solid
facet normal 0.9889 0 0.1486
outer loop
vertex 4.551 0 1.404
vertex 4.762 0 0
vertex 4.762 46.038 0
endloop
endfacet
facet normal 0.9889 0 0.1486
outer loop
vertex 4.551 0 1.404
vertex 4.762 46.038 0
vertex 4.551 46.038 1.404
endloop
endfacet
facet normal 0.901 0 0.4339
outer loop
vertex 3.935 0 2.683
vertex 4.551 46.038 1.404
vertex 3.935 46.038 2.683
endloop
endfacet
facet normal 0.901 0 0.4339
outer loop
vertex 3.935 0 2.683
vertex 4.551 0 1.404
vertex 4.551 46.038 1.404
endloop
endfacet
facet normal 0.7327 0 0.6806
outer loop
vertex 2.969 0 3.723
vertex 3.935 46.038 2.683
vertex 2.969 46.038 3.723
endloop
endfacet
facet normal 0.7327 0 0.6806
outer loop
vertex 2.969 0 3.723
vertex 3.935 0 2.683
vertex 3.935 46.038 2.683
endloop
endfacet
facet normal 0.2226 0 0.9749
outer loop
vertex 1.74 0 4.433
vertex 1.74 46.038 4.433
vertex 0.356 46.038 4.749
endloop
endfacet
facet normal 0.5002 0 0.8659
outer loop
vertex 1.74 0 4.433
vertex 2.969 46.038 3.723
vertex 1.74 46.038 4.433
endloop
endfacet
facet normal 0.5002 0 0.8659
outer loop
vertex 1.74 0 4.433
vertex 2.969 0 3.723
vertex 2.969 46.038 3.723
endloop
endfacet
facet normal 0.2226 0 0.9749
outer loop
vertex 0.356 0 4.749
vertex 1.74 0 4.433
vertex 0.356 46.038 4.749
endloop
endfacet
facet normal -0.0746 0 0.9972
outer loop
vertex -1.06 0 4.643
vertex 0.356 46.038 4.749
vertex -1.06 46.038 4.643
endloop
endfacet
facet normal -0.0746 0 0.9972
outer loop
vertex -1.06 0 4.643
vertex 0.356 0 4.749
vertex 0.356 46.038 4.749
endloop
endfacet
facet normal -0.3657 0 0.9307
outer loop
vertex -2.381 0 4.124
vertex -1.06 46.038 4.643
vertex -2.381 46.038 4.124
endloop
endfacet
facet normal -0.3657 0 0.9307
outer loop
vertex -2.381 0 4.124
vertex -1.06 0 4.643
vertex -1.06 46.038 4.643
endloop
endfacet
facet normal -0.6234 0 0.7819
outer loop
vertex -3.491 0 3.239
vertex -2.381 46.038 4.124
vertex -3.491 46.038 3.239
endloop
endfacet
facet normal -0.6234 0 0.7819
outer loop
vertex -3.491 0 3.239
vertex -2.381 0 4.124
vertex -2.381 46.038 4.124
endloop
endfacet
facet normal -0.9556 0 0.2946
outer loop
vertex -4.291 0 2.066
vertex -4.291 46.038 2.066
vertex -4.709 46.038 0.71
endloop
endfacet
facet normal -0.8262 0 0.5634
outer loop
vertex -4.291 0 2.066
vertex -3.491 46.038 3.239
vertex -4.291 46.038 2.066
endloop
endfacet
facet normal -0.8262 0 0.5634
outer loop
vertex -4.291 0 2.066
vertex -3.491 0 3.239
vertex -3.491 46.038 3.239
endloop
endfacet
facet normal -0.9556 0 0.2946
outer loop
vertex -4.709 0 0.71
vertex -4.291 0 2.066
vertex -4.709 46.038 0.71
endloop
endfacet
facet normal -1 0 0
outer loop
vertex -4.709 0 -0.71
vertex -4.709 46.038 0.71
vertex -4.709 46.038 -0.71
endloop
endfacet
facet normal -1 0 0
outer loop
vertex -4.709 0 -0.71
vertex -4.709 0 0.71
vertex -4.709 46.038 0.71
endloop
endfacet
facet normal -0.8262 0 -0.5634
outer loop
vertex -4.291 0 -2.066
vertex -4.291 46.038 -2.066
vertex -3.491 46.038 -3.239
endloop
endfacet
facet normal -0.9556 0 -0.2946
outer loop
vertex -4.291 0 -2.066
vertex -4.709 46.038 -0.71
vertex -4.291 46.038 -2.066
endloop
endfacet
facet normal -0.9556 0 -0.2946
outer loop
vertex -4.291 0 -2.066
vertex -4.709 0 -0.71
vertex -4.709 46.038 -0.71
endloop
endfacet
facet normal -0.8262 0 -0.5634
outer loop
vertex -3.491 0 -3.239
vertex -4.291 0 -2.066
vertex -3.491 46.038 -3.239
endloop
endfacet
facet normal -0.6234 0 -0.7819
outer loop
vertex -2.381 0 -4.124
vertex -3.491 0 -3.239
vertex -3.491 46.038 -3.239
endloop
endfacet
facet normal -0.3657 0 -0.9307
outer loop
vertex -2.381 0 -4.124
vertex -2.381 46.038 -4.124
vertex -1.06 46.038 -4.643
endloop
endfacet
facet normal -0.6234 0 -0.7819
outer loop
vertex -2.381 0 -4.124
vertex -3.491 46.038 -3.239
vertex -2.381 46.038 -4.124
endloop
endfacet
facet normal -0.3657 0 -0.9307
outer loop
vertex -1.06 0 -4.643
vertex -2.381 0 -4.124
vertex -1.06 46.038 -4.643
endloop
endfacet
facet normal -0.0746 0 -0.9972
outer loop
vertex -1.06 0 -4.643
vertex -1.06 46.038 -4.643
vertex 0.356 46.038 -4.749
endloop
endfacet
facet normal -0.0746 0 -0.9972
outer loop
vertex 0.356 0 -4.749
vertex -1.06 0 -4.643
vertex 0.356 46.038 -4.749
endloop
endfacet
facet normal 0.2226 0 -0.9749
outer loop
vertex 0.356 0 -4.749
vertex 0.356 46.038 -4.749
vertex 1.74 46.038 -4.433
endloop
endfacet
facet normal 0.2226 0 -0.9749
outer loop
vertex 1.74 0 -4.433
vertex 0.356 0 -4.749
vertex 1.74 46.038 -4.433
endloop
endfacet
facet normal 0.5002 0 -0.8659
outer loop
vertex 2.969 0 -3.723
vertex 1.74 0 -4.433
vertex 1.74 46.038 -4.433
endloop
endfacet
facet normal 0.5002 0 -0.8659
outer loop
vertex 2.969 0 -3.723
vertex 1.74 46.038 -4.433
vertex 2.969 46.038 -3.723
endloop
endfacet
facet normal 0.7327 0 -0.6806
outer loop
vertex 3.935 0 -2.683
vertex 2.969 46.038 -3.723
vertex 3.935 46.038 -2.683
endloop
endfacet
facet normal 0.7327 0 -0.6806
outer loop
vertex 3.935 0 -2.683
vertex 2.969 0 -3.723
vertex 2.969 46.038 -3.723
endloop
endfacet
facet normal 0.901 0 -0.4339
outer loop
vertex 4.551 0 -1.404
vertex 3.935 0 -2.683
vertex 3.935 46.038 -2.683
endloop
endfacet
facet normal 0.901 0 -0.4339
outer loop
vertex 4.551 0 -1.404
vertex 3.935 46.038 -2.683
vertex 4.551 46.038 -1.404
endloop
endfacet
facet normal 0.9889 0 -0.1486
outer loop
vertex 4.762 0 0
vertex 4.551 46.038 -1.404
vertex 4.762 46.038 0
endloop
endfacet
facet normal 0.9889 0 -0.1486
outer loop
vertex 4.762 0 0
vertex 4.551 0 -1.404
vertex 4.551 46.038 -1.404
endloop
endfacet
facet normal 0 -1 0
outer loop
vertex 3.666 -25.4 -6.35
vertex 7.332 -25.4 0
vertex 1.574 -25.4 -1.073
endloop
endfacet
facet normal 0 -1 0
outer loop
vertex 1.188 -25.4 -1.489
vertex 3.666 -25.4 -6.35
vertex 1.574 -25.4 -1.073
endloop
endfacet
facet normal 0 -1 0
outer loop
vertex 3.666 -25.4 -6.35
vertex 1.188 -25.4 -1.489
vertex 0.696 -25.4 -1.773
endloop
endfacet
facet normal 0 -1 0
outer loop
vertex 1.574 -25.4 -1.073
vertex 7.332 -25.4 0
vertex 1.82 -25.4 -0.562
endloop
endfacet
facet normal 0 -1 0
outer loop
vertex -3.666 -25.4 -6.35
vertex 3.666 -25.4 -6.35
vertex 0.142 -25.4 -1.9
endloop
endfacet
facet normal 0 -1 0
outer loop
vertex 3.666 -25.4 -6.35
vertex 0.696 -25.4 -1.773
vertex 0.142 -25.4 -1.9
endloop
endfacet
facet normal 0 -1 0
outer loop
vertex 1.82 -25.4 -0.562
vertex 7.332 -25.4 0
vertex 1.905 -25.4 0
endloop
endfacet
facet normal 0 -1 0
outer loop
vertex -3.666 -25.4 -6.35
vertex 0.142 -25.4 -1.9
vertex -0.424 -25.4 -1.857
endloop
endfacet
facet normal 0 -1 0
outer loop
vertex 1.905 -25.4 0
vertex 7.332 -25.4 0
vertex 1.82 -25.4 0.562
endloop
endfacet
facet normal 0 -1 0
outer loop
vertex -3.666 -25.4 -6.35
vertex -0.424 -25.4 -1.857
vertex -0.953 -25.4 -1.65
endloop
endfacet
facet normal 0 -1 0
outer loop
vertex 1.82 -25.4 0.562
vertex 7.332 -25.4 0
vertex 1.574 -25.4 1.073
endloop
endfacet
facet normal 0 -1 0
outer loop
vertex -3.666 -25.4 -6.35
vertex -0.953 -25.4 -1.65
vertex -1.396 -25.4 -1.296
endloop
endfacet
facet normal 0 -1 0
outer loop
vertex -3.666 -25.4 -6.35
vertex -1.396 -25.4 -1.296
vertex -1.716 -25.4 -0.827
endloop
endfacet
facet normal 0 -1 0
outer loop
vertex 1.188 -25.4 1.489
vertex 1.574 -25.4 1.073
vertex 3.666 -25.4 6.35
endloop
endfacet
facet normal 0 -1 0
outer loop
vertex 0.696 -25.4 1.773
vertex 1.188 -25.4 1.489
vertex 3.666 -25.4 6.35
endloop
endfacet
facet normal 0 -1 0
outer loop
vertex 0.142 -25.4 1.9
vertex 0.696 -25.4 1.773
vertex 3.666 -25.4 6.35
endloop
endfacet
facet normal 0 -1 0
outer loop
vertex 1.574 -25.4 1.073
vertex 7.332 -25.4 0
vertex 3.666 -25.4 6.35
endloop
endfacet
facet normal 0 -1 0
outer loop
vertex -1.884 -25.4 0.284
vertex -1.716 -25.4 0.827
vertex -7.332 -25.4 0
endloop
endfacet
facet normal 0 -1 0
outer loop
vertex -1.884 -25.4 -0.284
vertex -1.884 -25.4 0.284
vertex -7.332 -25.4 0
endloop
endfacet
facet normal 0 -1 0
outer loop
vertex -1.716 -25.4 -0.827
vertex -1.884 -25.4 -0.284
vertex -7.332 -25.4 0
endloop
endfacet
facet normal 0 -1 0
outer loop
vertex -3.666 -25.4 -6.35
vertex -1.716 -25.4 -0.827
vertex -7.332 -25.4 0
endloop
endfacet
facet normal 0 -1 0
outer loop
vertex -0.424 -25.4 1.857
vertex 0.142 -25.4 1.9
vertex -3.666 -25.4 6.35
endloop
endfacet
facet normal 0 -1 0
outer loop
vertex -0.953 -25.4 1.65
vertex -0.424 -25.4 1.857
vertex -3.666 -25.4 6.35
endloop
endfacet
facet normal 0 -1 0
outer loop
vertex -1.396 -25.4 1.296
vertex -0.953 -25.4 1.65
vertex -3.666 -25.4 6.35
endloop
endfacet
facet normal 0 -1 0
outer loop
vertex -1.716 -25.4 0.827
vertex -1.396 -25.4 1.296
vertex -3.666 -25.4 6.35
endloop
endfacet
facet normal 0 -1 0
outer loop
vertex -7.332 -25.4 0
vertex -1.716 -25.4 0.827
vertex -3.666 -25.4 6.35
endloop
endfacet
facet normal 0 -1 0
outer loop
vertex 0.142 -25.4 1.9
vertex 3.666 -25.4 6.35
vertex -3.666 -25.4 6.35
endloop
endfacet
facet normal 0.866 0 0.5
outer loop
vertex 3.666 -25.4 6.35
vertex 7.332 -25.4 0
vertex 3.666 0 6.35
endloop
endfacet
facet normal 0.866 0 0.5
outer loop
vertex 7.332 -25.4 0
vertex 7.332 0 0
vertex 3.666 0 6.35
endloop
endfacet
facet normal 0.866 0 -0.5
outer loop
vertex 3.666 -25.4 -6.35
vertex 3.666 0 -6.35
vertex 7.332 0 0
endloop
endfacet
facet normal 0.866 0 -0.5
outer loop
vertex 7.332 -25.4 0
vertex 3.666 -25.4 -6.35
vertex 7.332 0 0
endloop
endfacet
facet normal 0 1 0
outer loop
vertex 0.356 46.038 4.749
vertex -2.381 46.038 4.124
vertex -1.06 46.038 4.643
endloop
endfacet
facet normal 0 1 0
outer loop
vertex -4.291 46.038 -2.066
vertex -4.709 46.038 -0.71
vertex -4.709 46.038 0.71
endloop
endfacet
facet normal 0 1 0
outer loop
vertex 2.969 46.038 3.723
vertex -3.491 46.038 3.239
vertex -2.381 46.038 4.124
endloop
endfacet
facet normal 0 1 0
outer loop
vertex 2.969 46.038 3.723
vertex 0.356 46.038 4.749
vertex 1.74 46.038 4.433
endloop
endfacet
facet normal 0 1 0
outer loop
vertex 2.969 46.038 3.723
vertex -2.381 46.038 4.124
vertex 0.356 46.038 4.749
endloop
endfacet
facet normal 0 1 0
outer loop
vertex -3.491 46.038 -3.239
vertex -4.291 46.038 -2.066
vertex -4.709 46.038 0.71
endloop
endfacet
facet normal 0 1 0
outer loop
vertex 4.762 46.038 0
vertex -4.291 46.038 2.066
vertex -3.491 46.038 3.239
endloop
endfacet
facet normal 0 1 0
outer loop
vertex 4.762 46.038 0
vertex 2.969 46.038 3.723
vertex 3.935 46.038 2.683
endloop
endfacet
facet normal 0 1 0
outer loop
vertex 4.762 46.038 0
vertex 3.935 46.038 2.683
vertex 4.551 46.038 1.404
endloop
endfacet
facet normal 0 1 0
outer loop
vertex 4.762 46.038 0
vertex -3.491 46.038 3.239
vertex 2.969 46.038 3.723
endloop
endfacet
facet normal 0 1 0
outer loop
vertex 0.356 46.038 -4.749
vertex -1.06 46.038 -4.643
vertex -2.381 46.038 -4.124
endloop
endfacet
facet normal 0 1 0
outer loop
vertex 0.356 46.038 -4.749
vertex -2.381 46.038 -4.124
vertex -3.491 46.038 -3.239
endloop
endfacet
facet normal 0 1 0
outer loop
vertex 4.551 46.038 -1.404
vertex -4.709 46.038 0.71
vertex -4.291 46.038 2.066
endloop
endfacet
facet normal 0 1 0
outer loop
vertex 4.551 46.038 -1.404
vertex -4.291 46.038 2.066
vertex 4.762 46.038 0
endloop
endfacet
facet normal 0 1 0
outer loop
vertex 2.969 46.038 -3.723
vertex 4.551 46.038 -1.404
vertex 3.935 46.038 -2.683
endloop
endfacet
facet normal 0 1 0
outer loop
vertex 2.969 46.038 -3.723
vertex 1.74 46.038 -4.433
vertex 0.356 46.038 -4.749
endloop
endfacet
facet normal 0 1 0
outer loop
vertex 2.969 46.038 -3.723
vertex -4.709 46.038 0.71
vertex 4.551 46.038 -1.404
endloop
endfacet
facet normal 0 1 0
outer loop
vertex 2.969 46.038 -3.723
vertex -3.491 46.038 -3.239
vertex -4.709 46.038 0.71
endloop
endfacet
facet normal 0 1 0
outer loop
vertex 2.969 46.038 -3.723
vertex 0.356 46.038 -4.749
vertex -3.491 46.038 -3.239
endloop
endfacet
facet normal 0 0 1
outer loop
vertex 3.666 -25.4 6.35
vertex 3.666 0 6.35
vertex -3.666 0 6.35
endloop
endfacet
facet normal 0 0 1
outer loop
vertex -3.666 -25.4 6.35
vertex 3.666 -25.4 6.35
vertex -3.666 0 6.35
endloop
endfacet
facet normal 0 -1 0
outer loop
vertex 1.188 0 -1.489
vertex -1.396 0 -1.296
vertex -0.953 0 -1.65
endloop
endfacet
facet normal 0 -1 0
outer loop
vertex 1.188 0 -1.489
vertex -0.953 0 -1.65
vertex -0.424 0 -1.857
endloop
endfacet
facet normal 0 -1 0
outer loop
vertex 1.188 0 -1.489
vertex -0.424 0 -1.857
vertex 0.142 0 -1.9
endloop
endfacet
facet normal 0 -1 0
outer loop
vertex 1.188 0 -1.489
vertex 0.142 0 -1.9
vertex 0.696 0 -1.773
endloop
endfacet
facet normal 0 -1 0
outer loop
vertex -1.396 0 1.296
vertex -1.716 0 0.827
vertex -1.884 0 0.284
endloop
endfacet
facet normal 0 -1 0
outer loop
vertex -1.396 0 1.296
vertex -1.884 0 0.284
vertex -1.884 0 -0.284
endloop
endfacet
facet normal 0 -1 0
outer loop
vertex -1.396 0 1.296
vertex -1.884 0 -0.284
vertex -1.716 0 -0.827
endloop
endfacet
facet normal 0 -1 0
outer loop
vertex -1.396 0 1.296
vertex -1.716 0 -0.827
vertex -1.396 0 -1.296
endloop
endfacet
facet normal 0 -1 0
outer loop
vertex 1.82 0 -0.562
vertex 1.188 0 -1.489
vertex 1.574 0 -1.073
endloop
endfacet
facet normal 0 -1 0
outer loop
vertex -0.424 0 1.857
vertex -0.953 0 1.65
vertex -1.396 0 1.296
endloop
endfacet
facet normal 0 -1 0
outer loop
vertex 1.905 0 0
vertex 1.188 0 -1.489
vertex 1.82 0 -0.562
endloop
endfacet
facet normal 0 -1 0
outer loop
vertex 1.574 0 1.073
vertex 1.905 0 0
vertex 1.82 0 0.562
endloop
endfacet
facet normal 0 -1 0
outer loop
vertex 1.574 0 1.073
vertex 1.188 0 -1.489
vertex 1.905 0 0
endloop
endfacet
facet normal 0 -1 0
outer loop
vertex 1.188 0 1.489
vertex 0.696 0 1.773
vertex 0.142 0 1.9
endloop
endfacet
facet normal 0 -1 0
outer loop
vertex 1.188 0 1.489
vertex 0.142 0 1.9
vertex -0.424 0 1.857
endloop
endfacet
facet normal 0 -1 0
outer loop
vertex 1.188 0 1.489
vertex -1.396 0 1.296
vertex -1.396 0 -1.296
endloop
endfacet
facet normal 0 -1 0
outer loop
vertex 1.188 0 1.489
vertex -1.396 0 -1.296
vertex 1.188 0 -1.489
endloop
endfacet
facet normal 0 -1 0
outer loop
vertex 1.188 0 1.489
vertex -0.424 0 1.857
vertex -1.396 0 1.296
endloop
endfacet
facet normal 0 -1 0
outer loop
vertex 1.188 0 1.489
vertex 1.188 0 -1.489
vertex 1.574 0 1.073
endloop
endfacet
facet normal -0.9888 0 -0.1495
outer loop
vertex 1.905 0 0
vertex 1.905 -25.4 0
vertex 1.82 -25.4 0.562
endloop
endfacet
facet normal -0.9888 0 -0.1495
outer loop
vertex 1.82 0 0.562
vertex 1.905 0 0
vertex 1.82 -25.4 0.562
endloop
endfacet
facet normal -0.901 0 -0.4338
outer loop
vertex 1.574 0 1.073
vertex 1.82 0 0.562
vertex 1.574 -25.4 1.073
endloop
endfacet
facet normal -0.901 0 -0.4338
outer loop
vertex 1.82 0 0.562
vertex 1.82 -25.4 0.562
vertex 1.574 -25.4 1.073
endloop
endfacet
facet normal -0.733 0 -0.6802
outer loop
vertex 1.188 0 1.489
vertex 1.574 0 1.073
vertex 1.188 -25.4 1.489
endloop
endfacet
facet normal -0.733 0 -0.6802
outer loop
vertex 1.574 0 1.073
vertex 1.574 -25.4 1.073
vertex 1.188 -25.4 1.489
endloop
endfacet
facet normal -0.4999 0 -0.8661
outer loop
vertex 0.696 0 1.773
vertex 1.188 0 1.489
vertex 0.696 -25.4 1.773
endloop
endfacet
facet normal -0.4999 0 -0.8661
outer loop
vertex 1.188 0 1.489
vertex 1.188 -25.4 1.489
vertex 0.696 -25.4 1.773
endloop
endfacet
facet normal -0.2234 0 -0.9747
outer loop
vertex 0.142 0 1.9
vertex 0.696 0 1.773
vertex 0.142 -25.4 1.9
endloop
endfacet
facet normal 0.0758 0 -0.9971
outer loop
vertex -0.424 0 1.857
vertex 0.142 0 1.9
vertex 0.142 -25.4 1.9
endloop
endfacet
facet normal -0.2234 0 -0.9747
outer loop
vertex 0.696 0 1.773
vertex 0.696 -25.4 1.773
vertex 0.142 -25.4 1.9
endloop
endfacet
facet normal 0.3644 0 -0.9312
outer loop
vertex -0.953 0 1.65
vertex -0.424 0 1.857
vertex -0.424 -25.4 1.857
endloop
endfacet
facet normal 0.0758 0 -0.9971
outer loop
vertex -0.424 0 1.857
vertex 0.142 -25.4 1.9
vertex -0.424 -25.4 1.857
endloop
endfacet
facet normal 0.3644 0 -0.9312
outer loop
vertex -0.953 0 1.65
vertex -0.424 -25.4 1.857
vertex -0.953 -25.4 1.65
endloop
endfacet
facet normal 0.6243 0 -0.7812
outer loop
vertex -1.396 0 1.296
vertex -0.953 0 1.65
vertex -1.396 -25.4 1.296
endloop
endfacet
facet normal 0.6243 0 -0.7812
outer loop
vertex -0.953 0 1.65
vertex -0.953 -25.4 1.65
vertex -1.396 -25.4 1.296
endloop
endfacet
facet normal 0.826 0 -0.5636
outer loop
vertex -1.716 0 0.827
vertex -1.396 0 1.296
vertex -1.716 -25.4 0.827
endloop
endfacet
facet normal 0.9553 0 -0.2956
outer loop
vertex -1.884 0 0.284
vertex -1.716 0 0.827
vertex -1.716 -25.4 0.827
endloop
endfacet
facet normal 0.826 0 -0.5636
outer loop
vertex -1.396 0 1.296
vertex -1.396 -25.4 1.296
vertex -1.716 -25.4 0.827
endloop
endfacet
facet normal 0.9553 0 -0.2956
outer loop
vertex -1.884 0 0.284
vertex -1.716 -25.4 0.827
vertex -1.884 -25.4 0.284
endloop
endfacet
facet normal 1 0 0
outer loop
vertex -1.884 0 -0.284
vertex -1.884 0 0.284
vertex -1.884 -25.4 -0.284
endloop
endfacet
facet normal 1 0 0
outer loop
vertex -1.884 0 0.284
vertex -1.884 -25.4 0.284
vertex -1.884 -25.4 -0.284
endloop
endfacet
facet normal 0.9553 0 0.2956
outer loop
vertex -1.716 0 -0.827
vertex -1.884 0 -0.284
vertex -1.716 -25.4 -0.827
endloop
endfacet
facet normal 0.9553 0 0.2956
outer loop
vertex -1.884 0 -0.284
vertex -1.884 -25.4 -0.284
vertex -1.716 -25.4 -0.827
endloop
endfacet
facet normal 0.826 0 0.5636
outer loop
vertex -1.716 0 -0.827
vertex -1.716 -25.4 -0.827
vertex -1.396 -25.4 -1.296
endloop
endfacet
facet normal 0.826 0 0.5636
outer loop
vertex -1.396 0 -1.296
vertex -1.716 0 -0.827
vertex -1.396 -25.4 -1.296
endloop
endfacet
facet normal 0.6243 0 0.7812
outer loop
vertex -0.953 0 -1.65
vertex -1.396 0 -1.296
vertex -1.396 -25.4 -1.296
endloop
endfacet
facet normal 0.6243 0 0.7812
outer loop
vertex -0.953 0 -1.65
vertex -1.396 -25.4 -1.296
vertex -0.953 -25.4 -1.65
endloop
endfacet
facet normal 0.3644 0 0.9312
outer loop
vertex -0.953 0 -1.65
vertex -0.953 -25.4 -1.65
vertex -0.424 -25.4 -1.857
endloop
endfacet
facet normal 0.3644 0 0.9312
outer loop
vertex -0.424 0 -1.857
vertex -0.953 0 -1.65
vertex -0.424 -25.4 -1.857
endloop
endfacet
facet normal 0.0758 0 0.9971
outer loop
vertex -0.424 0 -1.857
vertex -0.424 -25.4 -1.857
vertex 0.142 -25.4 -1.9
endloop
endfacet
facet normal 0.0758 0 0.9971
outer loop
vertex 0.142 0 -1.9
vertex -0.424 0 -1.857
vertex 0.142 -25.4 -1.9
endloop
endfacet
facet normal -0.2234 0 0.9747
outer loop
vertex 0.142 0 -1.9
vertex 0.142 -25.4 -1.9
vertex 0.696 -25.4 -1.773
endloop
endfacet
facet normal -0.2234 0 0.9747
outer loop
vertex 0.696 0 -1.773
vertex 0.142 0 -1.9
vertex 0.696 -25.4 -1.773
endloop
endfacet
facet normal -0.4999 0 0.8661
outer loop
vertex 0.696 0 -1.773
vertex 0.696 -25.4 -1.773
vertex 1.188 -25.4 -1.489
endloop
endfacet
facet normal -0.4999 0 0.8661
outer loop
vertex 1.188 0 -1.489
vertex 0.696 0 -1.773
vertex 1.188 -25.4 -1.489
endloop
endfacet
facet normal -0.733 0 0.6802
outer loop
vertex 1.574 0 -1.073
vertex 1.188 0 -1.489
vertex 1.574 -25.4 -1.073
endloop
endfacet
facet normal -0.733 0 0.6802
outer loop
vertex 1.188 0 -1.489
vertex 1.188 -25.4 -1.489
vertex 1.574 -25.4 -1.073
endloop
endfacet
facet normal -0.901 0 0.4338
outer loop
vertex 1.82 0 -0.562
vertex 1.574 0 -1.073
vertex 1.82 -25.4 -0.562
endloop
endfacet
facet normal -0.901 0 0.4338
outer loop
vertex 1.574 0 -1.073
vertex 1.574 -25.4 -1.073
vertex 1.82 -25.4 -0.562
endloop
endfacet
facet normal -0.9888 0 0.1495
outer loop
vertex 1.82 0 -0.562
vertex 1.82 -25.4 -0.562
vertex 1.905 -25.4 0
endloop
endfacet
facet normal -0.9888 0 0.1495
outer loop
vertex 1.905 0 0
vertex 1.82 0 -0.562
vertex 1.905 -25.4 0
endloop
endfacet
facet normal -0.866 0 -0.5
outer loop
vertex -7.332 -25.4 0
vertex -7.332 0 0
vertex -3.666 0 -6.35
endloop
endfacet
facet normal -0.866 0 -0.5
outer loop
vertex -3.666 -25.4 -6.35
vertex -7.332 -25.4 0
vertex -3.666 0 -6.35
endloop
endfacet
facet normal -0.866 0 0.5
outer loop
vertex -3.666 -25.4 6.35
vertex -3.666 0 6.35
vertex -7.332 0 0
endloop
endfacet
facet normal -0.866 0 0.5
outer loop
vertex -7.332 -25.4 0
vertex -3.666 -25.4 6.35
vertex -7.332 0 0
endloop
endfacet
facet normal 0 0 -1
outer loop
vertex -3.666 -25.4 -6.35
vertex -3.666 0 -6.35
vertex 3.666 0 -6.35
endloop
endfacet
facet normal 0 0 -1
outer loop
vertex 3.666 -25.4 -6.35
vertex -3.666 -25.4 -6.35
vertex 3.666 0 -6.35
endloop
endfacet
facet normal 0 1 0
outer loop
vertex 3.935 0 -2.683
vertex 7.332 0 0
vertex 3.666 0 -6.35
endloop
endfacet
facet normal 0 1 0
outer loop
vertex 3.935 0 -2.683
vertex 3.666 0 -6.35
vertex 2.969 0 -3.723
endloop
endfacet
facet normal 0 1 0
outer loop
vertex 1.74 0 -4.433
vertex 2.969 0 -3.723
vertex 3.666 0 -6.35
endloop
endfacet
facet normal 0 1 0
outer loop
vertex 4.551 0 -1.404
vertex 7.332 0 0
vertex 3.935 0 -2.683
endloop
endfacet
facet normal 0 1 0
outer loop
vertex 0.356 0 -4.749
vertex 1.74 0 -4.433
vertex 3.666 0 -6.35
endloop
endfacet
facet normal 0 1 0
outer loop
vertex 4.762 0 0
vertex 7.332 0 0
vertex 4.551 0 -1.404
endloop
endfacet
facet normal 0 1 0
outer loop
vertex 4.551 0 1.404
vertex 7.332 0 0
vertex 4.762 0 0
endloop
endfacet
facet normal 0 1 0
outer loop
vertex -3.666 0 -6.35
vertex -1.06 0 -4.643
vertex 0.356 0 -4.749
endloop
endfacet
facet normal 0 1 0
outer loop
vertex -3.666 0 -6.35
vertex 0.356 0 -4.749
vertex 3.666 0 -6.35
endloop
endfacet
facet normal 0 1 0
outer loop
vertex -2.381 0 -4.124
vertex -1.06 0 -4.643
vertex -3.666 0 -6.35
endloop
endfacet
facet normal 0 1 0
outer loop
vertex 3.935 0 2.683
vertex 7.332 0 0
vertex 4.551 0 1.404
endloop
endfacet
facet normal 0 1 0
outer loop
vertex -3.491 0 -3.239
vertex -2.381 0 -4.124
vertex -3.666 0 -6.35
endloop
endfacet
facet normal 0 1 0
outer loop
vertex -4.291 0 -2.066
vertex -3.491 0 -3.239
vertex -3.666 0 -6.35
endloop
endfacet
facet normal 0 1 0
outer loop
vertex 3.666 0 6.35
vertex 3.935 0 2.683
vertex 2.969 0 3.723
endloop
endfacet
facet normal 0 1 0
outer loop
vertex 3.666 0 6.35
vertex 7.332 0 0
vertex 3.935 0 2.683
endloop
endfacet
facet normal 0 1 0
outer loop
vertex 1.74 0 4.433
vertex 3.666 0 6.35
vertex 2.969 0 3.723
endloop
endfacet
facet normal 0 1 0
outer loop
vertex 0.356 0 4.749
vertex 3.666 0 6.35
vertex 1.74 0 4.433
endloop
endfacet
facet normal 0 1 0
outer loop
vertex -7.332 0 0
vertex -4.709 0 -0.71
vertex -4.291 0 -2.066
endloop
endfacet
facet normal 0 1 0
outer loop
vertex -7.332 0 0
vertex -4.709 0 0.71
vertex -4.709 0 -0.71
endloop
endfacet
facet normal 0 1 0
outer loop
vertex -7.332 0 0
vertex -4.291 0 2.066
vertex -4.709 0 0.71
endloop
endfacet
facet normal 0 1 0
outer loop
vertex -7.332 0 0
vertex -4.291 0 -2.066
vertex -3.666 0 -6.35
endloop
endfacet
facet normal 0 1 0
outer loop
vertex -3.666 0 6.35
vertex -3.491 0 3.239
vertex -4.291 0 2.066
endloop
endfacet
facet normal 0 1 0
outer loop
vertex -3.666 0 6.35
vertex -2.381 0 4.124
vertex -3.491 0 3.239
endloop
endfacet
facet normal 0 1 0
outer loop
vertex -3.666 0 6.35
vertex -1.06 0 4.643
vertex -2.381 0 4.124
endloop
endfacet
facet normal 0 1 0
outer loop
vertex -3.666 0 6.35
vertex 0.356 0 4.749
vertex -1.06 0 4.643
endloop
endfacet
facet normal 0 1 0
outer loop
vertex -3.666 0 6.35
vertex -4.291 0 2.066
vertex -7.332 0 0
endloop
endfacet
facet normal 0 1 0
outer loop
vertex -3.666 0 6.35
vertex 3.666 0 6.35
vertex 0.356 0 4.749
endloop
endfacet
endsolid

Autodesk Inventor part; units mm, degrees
ref_plane "YZ Plane" through (0, 0, 0) normal (1, 0, 0) x (0, 1, 0)
ref_plane "XZ Plane" through (0, 0, 0) normal (0, 1, 0) x (-1, 0, 0)
ref_plane "XY Plane" through (0, 0, 0) normal (0, 0, 1) x (1, 0, 0)
sketch "Sketch1" plane through (0, 0, 0) normal (0, 1, 0) x (-1, 0, 0)
  line L0 (3.6662, -6.35) -> (-3.6662, -6.35)
  line L1 (-3.6662, -6.35) -> (-7.3323, 0)
  line L2 (-7.3323, 0) -> (-3.6662, 6.35)
  line L3 (-3.6662, 6.35) -> (3.6662, 6.35)
  line L4 (3.6662, 6.35) -> (7.3323, 0)
  line L5 (7.3323, 0) -> (3.6662, -6.35)
  point P0 (0, 0)
  point P1 (0, 0)
  dimension "d0" = 12.7
extrude "Extrusion1" add sketch "Sketch1" against normal blind 25.4
sketch "Sketch2" plane through (0, 0, 0) normal (0, 1, 0) x (1, 0, 0)
  circle A0 centre (0, 0) radius 4.7625
  dimension "d3" = 9.525
extrude "Extrusion2" add sketch "Sketch2" along normal blind 46.0375
sketch "Sketch3" plane through (0, -25.4, 0) normal (0, -1, 0) x (1, 0, 0)
  circle A0 centre (0, 0) radius 4.7625 projected
  circle A1 centre (0, 0) radius 1.905
  dimension "d7" = 3.81
extrude "Extrusion3" cut sketch "Sketch3" against normal blind 25.4 contours A1
properties part number "Roller shaft" material "Aluminum 6061"
